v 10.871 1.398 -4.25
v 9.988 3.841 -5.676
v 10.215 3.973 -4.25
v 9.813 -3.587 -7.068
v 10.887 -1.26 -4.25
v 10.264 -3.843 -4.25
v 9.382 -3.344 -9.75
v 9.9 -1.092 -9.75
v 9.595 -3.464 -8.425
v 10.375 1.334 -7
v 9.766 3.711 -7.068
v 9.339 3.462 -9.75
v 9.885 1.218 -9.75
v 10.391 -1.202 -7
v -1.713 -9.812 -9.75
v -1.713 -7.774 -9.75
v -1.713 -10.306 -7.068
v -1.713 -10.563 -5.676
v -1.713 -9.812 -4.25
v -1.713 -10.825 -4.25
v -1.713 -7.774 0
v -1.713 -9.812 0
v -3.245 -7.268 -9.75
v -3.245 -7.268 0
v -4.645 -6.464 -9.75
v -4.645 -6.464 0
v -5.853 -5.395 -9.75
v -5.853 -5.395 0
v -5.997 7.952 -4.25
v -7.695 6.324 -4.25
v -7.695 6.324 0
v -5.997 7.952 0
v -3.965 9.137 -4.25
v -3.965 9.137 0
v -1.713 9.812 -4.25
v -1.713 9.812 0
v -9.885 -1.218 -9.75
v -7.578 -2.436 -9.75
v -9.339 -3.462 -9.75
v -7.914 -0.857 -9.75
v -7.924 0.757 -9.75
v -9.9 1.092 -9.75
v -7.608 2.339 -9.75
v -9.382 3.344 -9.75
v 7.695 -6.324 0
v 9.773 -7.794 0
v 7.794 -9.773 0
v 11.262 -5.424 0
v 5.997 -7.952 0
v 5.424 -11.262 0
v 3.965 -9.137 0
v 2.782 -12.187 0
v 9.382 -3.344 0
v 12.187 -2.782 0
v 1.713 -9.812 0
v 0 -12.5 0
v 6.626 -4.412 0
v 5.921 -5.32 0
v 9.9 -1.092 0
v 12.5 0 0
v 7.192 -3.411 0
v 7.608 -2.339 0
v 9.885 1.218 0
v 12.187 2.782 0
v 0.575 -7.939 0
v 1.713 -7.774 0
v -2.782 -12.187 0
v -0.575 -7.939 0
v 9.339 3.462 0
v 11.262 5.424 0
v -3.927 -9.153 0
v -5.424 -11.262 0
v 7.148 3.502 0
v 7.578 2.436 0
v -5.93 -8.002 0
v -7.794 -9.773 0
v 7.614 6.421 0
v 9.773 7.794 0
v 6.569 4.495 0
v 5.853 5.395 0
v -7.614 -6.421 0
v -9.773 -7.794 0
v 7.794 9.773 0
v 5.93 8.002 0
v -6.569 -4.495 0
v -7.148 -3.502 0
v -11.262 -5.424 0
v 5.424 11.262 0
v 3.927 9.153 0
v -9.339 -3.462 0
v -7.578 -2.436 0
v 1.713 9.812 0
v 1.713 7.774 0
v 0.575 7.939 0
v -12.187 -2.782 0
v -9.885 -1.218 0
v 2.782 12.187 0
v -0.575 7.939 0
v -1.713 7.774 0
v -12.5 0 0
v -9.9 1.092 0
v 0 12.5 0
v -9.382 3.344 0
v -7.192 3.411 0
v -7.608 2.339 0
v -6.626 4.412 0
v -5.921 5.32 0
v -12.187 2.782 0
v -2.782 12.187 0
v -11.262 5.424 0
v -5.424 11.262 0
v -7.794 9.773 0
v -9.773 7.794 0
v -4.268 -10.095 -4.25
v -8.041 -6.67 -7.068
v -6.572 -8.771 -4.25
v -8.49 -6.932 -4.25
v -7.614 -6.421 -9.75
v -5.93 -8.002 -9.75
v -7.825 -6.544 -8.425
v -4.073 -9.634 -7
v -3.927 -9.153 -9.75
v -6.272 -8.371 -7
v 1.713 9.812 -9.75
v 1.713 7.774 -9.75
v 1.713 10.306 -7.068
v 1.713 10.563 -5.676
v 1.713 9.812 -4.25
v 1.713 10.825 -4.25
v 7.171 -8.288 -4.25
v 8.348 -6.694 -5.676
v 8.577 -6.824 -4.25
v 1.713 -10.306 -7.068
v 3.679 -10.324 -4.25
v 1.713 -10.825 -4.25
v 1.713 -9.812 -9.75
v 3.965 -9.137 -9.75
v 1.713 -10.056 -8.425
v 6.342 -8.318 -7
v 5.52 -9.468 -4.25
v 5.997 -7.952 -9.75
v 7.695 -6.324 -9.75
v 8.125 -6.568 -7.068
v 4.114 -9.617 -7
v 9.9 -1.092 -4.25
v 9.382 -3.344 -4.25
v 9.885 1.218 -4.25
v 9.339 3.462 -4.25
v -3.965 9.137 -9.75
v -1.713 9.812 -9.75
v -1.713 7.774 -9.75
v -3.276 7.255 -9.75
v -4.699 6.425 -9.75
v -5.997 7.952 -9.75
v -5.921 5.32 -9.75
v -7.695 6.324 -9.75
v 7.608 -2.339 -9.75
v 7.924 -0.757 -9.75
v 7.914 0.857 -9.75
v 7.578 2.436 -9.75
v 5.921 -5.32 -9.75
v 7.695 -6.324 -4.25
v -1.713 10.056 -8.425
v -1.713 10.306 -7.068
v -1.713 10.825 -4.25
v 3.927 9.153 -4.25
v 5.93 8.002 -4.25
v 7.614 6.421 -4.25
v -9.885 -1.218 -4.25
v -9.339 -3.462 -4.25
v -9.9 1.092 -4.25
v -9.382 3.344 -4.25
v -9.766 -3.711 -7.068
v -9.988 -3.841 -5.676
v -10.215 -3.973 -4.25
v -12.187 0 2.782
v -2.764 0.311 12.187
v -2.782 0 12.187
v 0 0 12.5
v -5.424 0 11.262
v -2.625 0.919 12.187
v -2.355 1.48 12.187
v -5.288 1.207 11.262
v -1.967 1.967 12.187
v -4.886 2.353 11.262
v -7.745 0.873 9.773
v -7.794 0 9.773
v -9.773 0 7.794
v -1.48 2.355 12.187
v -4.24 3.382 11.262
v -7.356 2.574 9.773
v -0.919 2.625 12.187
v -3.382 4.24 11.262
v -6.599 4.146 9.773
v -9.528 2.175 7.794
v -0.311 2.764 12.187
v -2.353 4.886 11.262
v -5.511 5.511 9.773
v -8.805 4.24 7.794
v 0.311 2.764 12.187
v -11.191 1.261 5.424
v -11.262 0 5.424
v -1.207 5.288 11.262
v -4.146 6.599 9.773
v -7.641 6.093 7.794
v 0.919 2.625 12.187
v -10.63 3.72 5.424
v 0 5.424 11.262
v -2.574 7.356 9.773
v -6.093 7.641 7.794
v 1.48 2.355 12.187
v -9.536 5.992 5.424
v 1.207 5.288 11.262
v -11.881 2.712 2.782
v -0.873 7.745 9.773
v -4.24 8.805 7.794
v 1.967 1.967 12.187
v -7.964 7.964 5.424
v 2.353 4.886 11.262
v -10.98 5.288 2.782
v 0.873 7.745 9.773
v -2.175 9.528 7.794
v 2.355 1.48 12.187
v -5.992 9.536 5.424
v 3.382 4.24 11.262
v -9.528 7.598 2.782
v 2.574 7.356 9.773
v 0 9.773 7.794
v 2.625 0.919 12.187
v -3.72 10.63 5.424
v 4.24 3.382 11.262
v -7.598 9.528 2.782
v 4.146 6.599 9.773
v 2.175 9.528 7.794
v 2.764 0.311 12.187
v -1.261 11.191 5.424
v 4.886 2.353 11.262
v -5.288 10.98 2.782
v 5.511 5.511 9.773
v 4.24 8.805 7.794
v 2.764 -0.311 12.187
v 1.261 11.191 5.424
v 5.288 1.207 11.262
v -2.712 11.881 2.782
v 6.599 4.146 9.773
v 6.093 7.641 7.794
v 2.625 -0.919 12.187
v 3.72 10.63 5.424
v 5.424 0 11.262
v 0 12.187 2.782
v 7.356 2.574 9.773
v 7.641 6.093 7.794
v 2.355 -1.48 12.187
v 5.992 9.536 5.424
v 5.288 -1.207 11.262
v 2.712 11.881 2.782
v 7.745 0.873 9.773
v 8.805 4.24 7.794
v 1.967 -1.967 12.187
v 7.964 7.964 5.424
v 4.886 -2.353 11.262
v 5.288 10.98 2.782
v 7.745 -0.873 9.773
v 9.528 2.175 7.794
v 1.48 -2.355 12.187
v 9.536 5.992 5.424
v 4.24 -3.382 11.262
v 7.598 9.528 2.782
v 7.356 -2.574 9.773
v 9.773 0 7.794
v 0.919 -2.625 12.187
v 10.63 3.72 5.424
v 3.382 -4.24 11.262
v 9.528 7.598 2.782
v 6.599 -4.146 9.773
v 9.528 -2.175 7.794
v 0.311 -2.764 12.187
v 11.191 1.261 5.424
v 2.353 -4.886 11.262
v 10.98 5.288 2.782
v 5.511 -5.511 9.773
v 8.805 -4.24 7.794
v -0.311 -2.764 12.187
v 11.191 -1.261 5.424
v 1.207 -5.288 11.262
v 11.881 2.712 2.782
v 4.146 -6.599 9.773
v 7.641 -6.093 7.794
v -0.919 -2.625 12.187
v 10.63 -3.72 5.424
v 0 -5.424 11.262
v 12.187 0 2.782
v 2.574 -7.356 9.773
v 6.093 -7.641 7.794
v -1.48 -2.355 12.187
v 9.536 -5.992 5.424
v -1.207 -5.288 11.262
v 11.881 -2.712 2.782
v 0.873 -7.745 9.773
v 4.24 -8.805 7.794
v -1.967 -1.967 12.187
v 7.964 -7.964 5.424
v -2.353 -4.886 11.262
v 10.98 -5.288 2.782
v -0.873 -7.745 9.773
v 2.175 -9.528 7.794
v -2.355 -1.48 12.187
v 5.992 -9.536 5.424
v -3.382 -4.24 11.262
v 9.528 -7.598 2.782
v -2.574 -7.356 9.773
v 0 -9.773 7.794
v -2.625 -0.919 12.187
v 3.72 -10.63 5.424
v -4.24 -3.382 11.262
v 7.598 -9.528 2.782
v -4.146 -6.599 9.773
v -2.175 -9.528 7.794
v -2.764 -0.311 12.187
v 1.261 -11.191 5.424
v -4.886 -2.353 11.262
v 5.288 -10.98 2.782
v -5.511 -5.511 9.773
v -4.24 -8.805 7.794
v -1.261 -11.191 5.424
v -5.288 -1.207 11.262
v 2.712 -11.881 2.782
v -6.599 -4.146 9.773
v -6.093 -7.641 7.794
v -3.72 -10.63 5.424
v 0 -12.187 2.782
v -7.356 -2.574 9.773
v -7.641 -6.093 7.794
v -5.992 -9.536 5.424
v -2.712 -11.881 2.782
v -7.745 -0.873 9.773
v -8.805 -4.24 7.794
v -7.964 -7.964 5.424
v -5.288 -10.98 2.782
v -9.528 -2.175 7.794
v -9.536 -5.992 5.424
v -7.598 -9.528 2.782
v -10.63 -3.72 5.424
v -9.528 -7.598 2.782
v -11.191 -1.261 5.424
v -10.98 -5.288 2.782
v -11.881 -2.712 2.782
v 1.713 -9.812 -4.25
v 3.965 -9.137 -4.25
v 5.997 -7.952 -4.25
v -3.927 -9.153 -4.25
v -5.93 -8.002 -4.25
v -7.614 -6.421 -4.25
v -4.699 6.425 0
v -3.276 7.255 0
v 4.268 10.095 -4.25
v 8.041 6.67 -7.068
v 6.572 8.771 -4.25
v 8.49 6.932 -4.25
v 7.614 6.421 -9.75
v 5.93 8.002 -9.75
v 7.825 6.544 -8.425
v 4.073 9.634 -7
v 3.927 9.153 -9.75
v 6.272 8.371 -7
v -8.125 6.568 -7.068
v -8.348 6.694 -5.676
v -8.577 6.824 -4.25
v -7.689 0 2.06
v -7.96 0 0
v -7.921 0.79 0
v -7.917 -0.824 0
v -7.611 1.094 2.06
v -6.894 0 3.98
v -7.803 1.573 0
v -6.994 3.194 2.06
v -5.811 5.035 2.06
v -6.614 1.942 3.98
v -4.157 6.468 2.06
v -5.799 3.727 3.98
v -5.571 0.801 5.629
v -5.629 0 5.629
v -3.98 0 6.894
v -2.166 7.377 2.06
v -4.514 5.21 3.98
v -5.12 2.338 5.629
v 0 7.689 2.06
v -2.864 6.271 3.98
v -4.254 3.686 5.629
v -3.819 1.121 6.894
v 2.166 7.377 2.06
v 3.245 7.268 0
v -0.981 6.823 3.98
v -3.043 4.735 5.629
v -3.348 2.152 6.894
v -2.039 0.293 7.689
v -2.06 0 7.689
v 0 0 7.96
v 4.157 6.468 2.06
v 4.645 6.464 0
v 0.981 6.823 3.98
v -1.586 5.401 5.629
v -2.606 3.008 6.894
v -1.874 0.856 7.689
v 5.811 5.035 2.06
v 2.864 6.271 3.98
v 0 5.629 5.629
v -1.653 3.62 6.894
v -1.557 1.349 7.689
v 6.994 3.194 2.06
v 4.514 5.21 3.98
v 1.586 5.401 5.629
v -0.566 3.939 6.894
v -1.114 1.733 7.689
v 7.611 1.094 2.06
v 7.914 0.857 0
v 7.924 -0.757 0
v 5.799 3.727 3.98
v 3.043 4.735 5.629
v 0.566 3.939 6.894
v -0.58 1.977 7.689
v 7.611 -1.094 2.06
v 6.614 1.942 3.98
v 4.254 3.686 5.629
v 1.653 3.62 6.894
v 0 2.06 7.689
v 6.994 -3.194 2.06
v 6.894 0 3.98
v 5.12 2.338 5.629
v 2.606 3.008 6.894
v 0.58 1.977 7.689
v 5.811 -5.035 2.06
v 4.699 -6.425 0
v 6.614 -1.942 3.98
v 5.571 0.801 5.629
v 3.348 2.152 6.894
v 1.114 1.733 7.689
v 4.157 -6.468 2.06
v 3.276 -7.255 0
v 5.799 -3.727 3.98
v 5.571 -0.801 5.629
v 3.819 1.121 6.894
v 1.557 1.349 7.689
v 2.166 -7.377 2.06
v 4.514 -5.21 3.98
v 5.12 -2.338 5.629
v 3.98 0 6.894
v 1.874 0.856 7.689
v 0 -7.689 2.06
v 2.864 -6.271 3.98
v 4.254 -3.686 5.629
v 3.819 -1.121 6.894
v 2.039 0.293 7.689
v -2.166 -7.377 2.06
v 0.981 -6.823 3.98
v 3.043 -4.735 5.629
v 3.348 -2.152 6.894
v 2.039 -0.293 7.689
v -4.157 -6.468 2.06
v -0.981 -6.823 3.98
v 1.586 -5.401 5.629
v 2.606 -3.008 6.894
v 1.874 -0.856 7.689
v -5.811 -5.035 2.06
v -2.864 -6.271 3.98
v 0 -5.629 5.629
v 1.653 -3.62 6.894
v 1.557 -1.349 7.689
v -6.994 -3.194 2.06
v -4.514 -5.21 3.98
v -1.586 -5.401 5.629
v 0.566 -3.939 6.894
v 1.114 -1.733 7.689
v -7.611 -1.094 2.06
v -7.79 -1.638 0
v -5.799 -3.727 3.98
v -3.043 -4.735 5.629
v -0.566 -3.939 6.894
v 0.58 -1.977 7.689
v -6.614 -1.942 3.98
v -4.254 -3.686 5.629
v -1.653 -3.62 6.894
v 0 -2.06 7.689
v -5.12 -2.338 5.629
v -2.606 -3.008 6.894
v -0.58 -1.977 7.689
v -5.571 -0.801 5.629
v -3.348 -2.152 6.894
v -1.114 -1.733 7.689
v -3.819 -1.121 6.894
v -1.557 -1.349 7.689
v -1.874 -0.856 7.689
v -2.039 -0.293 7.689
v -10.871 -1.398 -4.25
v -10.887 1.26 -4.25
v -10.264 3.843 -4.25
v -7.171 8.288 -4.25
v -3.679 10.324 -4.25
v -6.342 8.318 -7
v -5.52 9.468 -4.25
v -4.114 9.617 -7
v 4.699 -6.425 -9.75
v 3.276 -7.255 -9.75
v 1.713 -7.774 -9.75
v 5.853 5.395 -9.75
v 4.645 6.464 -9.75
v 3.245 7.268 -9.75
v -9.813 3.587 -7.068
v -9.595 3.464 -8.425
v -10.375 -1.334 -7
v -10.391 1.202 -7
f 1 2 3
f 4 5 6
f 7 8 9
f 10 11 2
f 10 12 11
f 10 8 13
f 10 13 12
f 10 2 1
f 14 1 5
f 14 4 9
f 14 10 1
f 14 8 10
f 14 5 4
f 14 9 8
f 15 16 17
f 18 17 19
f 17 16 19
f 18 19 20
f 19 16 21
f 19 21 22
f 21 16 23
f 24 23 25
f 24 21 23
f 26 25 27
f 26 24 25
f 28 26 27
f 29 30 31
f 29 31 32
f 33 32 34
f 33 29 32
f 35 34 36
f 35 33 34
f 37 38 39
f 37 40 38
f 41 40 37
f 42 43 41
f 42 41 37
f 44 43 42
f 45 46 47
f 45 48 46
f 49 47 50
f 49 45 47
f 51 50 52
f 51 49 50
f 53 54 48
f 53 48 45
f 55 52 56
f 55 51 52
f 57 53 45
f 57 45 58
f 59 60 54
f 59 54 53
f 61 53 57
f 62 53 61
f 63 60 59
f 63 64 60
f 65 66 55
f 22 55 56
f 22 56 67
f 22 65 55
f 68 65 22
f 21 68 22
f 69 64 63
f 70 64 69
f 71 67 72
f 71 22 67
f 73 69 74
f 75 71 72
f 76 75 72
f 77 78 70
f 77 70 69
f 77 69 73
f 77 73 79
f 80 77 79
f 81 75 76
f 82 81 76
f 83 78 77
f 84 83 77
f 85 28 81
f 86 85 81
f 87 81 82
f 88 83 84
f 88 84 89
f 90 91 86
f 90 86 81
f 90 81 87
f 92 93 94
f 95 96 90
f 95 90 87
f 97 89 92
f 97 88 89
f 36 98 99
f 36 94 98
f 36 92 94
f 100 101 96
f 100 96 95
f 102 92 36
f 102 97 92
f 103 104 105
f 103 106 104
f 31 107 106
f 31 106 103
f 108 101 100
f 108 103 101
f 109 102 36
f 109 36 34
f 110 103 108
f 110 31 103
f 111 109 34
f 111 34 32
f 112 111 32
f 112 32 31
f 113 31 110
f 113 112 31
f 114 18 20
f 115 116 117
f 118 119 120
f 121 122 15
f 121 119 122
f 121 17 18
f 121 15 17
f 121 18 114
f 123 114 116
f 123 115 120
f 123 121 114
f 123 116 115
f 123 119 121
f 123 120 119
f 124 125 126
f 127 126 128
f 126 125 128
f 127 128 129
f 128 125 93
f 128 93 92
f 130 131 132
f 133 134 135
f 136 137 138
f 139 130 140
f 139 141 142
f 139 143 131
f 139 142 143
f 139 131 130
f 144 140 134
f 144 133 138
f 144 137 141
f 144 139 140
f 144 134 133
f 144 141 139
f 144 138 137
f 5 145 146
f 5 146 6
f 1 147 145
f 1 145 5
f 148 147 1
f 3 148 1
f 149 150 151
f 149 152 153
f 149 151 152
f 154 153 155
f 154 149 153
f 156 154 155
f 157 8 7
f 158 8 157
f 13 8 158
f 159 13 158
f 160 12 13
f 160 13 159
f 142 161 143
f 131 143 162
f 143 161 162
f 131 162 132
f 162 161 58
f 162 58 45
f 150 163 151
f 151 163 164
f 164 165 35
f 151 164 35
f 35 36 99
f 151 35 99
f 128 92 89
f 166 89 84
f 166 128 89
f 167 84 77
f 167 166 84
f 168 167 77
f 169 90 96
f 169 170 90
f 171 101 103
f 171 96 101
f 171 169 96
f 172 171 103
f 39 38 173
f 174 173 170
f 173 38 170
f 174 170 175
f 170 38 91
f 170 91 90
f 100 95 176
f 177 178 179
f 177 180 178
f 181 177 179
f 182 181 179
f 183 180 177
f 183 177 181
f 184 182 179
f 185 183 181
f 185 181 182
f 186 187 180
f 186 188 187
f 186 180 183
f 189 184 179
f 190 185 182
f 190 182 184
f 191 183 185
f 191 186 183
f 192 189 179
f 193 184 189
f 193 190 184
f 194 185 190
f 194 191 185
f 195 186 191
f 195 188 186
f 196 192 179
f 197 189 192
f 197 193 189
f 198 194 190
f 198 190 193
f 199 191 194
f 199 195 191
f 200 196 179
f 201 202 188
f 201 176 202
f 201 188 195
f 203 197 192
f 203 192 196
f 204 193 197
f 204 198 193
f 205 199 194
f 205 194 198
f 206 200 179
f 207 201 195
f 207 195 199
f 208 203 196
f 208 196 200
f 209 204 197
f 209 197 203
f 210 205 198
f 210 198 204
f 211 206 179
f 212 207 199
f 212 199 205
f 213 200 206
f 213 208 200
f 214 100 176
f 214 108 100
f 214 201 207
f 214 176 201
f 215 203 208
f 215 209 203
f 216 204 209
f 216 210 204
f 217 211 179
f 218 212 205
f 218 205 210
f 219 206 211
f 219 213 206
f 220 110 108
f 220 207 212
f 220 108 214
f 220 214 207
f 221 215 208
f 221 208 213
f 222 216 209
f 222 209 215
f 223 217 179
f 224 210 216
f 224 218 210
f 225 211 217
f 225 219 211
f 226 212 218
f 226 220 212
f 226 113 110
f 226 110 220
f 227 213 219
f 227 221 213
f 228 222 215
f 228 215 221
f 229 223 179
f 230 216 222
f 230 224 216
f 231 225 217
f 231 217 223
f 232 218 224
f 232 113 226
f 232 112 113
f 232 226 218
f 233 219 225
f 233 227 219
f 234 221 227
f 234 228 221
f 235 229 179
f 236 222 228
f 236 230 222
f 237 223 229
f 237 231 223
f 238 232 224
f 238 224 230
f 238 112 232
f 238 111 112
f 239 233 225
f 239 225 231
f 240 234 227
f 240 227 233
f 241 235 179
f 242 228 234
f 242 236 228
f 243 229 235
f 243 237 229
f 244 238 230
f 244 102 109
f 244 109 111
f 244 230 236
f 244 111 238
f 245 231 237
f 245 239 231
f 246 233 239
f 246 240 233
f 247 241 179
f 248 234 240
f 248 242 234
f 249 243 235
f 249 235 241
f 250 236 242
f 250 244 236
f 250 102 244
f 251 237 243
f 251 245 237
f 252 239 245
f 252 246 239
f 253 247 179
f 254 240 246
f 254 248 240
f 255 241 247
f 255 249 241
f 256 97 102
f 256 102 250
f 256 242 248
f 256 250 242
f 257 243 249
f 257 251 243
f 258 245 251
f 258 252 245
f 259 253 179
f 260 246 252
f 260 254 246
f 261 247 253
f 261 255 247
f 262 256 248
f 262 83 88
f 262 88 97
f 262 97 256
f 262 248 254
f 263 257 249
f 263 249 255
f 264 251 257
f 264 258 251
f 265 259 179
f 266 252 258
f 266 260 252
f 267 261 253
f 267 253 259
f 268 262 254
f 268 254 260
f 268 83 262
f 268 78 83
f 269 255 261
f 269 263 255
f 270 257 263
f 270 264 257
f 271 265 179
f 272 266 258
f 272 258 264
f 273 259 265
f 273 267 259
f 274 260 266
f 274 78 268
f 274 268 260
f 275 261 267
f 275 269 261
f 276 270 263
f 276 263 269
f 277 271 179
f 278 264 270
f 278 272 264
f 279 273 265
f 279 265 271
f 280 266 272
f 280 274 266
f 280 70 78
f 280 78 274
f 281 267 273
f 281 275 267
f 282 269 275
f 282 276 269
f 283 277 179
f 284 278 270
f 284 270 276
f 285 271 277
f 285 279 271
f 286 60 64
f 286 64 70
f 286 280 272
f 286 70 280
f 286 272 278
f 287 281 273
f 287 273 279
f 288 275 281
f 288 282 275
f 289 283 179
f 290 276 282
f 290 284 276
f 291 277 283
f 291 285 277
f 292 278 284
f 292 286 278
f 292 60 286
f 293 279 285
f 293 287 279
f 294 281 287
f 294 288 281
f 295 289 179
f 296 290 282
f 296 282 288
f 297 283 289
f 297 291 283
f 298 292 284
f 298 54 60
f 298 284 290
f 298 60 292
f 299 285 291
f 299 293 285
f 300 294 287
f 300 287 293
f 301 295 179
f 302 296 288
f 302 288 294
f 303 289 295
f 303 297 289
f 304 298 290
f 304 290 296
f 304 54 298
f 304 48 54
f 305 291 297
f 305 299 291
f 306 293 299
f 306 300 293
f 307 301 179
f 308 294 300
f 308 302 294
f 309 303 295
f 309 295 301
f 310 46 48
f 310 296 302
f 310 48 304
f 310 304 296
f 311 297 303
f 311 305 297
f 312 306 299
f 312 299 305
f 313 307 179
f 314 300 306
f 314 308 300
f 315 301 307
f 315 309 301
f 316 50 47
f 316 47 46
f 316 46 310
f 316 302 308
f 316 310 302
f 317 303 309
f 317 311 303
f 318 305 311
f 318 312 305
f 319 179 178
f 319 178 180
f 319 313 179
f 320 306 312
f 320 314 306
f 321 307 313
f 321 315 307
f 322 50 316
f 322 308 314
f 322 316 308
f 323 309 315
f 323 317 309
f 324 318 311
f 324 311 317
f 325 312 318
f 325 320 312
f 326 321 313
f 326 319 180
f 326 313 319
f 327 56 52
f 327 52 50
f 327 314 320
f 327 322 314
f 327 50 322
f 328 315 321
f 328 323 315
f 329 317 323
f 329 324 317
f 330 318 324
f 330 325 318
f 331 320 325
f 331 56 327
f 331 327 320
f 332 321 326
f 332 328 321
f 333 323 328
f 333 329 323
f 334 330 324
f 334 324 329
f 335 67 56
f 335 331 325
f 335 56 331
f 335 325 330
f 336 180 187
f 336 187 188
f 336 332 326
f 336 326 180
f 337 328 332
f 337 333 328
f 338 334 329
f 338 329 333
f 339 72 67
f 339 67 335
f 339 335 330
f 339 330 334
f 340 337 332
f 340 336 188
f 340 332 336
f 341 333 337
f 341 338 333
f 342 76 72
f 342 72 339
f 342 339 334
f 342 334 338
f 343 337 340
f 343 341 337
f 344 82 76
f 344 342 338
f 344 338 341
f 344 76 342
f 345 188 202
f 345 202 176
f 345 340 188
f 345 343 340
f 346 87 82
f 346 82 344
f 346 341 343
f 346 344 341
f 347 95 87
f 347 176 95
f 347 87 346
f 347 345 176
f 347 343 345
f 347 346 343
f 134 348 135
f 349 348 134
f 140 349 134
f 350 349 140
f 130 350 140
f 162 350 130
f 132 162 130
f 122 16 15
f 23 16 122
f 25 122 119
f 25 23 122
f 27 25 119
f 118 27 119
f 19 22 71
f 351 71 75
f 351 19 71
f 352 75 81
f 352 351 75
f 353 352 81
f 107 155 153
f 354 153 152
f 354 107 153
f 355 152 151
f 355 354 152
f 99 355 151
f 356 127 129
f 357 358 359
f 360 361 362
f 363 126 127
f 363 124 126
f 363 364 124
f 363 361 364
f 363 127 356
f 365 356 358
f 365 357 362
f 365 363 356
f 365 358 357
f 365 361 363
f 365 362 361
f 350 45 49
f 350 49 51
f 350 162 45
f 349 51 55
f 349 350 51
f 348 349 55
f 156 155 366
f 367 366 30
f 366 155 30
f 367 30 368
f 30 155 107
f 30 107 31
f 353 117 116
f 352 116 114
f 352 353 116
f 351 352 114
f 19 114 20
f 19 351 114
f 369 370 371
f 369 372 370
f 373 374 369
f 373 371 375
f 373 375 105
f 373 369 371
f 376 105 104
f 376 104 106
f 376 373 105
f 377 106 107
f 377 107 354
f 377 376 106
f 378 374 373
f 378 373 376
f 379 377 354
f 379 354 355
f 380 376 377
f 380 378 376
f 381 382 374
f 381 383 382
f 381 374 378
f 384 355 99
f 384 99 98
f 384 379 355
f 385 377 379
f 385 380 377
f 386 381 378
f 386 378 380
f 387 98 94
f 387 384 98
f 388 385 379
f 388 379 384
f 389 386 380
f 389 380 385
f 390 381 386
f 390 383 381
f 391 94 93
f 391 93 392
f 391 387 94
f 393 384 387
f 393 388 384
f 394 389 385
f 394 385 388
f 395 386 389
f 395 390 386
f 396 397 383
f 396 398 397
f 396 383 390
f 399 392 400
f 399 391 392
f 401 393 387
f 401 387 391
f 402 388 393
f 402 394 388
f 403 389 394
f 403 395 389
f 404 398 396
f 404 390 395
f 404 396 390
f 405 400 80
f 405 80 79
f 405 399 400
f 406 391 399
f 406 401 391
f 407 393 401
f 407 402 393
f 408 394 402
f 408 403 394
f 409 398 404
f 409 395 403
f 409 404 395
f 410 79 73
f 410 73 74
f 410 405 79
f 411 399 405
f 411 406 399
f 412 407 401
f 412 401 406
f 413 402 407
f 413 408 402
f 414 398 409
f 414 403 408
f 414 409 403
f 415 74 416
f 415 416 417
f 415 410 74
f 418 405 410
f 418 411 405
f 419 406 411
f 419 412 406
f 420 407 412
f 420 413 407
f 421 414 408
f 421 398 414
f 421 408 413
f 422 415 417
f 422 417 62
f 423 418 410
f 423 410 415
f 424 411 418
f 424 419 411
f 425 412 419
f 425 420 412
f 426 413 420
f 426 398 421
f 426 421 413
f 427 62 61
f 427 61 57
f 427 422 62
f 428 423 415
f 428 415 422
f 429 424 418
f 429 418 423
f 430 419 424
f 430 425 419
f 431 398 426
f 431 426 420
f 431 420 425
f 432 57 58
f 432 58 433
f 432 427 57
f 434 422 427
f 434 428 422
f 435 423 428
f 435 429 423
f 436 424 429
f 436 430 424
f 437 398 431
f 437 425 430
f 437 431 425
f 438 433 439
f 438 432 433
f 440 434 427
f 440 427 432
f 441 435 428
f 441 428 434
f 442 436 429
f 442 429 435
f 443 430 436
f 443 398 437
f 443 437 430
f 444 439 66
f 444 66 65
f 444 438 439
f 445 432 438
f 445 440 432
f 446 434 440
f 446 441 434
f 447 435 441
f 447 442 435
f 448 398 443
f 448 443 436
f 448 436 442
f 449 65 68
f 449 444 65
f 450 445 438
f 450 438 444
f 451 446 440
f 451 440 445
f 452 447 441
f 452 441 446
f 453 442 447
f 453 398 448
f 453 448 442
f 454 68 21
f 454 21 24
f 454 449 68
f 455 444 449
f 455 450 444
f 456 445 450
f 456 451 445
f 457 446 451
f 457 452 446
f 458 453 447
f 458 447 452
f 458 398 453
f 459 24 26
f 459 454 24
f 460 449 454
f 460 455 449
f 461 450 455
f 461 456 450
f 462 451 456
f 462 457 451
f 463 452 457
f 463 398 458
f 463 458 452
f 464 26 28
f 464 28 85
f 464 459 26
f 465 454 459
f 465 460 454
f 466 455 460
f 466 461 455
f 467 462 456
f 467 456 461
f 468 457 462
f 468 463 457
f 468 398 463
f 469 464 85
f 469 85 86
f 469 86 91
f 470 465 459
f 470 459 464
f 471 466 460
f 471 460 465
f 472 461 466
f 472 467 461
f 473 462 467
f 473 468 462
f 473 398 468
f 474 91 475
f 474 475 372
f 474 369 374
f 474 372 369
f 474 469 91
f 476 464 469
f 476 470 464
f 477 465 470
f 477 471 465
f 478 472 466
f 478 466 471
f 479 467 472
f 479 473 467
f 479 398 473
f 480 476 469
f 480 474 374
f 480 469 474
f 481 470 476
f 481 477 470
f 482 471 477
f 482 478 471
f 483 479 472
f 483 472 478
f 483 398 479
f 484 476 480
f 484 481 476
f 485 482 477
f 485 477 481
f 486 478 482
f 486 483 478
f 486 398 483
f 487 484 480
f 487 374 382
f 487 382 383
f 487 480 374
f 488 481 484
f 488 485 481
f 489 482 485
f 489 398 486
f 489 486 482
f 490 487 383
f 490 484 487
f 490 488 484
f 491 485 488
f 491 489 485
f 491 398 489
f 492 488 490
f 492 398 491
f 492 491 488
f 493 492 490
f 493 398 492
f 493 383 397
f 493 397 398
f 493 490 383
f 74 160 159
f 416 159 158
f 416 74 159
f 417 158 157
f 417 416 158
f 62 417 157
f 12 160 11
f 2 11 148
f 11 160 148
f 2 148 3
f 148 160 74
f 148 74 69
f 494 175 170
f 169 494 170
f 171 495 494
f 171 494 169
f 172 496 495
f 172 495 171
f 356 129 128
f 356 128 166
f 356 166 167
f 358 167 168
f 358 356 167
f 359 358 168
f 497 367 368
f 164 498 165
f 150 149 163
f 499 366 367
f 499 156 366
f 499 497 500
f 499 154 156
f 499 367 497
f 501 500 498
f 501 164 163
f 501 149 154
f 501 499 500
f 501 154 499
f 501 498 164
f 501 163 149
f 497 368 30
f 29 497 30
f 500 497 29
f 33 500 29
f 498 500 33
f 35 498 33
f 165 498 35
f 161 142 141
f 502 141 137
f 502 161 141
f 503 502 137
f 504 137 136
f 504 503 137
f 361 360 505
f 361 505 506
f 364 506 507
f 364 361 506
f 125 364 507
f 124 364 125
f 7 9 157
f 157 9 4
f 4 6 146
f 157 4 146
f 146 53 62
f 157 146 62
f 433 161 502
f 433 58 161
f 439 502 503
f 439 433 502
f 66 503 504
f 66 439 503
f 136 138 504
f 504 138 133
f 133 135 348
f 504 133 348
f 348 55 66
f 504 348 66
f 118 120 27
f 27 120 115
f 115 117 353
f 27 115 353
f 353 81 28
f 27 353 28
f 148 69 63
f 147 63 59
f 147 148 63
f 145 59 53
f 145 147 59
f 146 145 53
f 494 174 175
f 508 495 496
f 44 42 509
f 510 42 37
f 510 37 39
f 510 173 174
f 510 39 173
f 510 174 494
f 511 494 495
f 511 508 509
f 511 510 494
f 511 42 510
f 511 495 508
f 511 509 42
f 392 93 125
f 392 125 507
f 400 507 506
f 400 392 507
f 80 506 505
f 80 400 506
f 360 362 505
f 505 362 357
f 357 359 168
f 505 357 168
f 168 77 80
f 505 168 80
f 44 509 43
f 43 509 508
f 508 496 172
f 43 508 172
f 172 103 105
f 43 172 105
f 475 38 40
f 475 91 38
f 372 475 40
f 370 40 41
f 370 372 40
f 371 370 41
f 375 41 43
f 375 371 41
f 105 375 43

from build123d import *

# Parameters (mm, degrees)
F3_FACE_R   = 9.96
F3_FACE_R_2 = 7.96
F2_DEPTH    = 9.751


with BuildPart() as f3:
    # F0 (on Front) → F3 (revolve)
    with BuildSketch(Plane.XZ):
        with BuildLine():
            ThreePointArc((0, 12.5), (-8.8388347648, 8.8388347648), (-12.5, 0))
            Line((-12.5, 0), (-9.96, 0))
            Line((-9.96, 0), (-9.96, -4.25))
            Line((-9.96, -4.25), (-10.96, -4.25))
            Line((-10.96, -4.25), (-9.96, -9.75))
            Line((-9.96, -9.75), (-7.96, -9.75))
            Line((-7.96, -9.75), (-7.96, 0))
            ThreePointArc((-7.96, 0), (-5.6285699782, 5.6285699782), (0, 7.96))
            Line((0, 7.96), (0, 12.5))
        make_face()
    revolve(axis=Axis((0, 0, 10.23), (0, 0, -1)))

    # F1 (on Top) + F3_face (on face) → F2 (cut, through all)
    with BuildSketch(Plane.XY):
        Polygon((1.712546451, 2.9807411881), (1.712546451, 21.5978231281), (-1.712546451, 21.5978231281), (-1.712546451, 2.9374864114), (-0.0125165538, 1.9750342288), align=None)
        Polygon((17.7959412298, 12.3573158479), (1.712546451, 2.9807411881), (1.712546451, 0.998409843), (3.4376094559, 0.0217854573), (19.5210042346, 9.3983601171), align=None)
        Polygon((1.712546451, 0.998409843), (1.712546451, 2.9807411881), (-0.0125165538, 1.9750342288), align=None)
        Polygon((-0.0125165538, 1.9750342288), (-1.712546451, 2.9374864114), (-1.712546451, 0.983921502), align=None)
        Polygon((-1.712546451, 0.983921502), (-1.712546451, 2.9374864114), (-17.9511316948, 12.1307728565), (-19.6385535579, 9.1501908926), (-3.4376094559, -0.0217854573), align=None)
        Polygon((3.4376094559, 0.0217854573), (1.712546451, 0.998409843), (1.712546451, -0.983921502), align=None)
        Polygon((-1.712546451, -0.998409843), (-1.712546451, 0.983921502), (-3.4376094559, -0.0217854573), align=None)
        Polygon((3.4376094559, 0.0217854573), (1.712546451, -0.983921502), (1.712546451, -2.9374864114), (17.9511316948, -12.1307728565), (19.6385535579, -9.1501908926), align=None)
        Polygon((1.712546451, -2.9374864114), (1.712546451, -0.983921502), (0.0125165538, -1.9750342288), align=None)
        Polygon((0.0125165538, -1.9750342288), (-1.712546451, -0.998409843), (-1.712546451, -2.9807411881), align=None)
        Polygon((-1.712546451, -2.9807411881), (-1.712546451, -0.998409843), (-3.4376094559, -0.0217854573), (-19.5210042346, -9.3983601171), (-17.7959412298, -12.3573158479), align=None)
        Polygon((1.712546451, -21.5978231281), (1.712546451, -2.9374864114), (0.0125165538, -1.9750342288), (-1.712546451, -2.9807411881), (-1.712546451, -21.5978231281), align=None)
    with BuildSketch(Plane(origin=(0, 0, -9.75), x_dir=(1, 0, 0), z_dir=(0, 0, -1))):
        Circle(F3_FACE_R)
        Circle(F3_FACE_R_2, mode=Mode.SUBTRACT)
    extrude(amount=-F2_DEPTH, dir=(0, 0, 1), mode=Mode.SUBTRACT)


solid = f3.part
